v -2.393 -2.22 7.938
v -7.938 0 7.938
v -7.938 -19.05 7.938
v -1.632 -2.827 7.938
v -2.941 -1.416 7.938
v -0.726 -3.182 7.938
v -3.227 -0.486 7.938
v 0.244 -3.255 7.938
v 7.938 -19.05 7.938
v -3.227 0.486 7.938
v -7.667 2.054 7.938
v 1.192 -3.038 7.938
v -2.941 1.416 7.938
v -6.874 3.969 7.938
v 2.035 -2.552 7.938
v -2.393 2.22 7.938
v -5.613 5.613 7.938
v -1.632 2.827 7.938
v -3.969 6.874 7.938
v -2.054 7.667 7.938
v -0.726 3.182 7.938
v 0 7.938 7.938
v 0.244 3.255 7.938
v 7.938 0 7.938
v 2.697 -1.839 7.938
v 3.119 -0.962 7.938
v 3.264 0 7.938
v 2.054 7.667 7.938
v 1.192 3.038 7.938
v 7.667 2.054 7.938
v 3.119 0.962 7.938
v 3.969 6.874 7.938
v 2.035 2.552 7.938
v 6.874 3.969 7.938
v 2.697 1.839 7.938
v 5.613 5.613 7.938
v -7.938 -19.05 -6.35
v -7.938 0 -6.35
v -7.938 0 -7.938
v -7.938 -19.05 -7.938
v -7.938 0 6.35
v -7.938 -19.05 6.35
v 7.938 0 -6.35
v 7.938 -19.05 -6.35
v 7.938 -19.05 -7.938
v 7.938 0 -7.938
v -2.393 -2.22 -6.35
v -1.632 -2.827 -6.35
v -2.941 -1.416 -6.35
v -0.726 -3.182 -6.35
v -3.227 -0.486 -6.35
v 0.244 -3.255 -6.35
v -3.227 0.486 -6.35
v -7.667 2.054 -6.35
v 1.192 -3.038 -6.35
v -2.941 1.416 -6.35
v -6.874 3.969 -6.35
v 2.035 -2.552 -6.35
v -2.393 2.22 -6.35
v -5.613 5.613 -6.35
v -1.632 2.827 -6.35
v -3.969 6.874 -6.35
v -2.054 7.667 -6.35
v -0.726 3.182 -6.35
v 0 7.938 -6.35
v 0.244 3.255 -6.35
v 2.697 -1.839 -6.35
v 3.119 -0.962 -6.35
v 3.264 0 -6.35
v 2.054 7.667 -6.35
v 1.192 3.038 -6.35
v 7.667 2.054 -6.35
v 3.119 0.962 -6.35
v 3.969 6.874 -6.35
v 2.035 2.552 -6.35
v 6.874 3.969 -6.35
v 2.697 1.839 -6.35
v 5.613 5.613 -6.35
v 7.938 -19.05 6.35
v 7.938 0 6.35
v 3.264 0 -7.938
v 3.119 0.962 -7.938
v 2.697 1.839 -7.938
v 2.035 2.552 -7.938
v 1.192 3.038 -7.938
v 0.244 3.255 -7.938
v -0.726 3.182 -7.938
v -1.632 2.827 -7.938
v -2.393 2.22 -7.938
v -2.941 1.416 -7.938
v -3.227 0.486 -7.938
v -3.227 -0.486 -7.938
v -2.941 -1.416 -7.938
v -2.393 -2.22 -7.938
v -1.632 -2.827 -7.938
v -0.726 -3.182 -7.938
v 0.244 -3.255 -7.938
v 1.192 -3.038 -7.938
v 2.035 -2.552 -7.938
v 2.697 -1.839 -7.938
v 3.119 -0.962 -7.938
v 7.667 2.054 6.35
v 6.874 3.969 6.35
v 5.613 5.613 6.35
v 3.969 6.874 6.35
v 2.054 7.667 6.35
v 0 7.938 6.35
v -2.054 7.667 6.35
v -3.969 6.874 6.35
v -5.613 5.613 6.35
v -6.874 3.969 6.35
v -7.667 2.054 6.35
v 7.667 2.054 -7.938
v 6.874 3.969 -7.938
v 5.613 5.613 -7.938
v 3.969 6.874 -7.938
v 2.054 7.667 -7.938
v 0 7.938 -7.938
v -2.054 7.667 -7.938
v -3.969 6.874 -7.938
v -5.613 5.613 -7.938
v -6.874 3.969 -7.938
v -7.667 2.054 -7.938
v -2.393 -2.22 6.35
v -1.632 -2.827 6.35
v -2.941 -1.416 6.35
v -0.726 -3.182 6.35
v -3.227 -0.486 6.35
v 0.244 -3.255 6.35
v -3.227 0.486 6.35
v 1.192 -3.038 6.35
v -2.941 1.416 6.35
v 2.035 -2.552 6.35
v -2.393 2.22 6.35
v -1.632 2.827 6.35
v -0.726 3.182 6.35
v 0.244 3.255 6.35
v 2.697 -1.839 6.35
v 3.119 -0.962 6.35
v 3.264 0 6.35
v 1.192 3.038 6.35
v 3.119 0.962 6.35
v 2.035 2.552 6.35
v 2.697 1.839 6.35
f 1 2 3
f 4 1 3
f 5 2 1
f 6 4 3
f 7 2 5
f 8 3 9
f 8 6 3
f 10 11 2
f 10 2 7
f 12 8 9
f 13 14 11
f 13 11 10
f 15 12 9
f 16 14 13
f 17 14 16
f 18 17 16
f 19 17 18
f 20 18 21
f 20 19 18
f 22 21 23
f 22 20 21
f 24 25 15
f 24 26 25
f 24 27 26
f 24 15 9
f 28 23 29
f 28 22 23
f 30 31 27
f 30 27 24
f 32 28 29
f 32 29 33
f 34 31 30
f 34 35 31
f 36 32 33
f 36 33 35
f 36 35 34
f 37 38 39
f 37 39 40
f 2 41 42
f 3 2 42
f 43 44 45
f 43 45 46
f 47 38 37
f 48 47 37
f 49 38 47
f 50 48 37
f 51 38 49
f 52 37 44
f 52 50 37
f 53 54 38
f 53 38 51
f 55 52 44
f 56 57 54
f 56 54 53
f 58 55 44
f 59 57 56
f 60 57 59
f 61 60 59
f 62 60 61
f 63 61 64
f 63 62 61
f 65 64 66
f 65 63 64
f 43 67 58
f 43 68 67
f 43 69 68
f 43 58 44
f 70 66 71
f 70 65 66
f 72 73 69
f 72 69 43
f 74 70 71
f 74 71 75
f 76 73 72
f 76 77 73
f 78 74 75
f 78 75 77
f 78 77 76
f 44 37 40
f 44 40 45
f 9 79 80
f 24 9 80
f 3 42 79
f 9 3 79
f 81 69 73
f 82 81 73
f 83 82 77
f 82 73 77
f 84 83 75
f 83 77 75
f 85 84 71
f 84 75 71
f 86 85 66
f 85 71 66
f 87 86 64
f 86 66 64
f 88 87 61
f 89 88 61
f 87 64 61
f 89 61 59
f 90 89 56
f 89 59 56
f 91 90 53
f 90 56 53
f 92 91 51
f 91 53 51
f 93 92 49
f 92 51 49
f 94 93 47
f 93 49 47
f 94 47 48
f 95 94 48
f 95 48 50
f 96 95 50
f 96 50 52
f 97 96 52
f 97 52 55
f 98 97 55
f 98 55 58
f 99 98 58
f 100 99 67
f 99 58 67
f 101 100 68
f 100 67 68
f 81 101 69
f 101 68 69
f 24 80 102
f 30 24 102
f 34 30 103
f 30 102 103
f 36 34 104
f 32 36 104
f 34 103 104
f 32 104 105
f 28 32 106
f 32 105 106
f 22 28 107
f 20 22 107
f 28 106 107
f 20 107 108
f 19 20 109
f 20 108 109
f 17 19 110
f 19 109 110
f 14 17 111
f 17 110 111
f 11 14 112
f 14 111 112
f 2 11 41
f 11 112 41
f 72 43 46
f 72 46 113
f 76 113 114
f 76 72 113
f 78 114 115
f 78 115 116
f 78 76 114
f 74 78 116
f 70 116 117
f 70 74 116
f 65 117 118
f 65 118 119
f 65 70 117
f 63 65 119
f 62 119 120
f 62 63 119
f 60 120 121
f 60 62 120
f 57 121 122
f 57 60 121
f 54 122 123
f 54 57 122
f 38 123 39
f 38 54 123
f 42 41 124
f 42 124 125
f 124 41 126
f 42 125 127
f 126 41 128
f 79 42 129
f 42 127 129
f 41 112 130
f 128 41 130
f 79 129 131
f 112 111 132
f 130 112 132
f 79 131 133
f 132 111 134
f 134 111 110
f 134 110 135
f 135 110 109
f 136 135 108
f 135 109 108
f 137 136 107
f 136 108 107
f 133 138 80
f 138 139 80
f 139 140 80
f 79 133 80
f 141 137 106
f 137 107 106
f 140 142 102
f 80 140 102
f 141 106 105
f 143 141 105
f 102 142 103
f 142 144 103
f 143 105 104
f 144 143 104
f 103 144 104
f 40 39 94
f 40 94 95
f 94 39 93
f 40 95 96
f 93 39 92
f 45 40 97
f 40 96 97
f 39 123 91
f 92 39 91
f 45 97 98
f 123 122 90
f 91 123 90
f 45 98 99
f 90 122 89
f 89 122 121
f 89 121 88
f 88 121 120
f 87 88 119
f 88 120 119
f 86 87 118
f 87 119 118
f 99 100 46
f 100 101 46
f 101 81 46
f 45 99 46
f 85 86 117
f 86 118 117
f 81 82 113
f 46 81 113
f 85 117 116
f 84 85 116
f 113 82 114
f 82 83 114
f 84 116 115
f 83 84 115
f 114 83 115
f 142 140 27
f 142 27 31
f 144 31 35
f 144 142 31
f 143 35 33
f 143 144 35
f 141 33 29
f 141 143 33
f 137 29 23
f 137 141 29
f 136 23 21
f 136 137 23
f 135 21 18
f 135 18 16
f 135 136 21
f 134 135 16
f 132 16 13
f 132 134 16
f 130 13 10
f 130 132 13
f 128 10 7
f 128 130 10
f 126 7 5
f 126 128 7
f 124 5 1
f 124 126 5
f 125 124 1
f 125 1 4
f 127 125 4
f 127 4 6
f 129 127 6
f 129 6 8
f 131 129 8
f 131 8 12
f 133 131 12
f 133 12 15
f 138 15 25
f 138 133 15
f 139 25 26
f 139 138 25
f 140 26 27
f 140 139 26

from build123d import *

# Parameters (mm, degrees)
BOSS_EXTRUDE1_START = 6.35
SKETCH1_R           = 3.2639
BOSS_EXTRUDE1_DEPTH = 1.5875
BOSS_EXTRUDE2_START = -6.35
SKETCH1_4_R         = 3.2639
BOSS_EXTRUDE2_DEPTH = 1.5875


with BuildPart() as part:
    # Sketch1 → Boss-Extrude1 (new body)
    with BuildSketch(Plane.XY.offset(BOSS_EXTRUDE1_START)):
        with BuildLine():
            ThreePointArc((7.9375, 0), (0, 7.9375), (-7.9375, 0))
            Line((-7.9375, 0), (-7.9375, -19.05))
            Line((-7.9375, -19.05), (7.9375, -19.05))
            Line((7.9375, -19.05), (7.9375, 0))
        make_face()
        Circle(SKETCH1_R, mode=Mode.SUBTRACT)
    extrude(amount=BOSS_EXTRUDE1_DEPTH)


with BuildPart() as body_2:
    # Sketch1<4> → Boss-Extrude2 (new body)
    with BuildSketch(Plane.XY.offset(BOSS_EXTRUDE2_START)):
        with BuildLine():
            ThreePointArc((7.9375, 0), (0, 7.9375), (-7.9375, 0))
            Line((-7.9375, 0), (-7.9375, -19.05))
            Line((-7.9375, -19.05), (7.9375, -19.05))
            Line((7.9375, -19.05), (7.9375, 0))
        make_face()
        Circle(SKETCH1_4_R, mode=Mode.SUBTRACT)
    extrude(amount=-BOSS_EXTRUDE2_DEPTH)


solid = Compound([part.part, body_2.part])
